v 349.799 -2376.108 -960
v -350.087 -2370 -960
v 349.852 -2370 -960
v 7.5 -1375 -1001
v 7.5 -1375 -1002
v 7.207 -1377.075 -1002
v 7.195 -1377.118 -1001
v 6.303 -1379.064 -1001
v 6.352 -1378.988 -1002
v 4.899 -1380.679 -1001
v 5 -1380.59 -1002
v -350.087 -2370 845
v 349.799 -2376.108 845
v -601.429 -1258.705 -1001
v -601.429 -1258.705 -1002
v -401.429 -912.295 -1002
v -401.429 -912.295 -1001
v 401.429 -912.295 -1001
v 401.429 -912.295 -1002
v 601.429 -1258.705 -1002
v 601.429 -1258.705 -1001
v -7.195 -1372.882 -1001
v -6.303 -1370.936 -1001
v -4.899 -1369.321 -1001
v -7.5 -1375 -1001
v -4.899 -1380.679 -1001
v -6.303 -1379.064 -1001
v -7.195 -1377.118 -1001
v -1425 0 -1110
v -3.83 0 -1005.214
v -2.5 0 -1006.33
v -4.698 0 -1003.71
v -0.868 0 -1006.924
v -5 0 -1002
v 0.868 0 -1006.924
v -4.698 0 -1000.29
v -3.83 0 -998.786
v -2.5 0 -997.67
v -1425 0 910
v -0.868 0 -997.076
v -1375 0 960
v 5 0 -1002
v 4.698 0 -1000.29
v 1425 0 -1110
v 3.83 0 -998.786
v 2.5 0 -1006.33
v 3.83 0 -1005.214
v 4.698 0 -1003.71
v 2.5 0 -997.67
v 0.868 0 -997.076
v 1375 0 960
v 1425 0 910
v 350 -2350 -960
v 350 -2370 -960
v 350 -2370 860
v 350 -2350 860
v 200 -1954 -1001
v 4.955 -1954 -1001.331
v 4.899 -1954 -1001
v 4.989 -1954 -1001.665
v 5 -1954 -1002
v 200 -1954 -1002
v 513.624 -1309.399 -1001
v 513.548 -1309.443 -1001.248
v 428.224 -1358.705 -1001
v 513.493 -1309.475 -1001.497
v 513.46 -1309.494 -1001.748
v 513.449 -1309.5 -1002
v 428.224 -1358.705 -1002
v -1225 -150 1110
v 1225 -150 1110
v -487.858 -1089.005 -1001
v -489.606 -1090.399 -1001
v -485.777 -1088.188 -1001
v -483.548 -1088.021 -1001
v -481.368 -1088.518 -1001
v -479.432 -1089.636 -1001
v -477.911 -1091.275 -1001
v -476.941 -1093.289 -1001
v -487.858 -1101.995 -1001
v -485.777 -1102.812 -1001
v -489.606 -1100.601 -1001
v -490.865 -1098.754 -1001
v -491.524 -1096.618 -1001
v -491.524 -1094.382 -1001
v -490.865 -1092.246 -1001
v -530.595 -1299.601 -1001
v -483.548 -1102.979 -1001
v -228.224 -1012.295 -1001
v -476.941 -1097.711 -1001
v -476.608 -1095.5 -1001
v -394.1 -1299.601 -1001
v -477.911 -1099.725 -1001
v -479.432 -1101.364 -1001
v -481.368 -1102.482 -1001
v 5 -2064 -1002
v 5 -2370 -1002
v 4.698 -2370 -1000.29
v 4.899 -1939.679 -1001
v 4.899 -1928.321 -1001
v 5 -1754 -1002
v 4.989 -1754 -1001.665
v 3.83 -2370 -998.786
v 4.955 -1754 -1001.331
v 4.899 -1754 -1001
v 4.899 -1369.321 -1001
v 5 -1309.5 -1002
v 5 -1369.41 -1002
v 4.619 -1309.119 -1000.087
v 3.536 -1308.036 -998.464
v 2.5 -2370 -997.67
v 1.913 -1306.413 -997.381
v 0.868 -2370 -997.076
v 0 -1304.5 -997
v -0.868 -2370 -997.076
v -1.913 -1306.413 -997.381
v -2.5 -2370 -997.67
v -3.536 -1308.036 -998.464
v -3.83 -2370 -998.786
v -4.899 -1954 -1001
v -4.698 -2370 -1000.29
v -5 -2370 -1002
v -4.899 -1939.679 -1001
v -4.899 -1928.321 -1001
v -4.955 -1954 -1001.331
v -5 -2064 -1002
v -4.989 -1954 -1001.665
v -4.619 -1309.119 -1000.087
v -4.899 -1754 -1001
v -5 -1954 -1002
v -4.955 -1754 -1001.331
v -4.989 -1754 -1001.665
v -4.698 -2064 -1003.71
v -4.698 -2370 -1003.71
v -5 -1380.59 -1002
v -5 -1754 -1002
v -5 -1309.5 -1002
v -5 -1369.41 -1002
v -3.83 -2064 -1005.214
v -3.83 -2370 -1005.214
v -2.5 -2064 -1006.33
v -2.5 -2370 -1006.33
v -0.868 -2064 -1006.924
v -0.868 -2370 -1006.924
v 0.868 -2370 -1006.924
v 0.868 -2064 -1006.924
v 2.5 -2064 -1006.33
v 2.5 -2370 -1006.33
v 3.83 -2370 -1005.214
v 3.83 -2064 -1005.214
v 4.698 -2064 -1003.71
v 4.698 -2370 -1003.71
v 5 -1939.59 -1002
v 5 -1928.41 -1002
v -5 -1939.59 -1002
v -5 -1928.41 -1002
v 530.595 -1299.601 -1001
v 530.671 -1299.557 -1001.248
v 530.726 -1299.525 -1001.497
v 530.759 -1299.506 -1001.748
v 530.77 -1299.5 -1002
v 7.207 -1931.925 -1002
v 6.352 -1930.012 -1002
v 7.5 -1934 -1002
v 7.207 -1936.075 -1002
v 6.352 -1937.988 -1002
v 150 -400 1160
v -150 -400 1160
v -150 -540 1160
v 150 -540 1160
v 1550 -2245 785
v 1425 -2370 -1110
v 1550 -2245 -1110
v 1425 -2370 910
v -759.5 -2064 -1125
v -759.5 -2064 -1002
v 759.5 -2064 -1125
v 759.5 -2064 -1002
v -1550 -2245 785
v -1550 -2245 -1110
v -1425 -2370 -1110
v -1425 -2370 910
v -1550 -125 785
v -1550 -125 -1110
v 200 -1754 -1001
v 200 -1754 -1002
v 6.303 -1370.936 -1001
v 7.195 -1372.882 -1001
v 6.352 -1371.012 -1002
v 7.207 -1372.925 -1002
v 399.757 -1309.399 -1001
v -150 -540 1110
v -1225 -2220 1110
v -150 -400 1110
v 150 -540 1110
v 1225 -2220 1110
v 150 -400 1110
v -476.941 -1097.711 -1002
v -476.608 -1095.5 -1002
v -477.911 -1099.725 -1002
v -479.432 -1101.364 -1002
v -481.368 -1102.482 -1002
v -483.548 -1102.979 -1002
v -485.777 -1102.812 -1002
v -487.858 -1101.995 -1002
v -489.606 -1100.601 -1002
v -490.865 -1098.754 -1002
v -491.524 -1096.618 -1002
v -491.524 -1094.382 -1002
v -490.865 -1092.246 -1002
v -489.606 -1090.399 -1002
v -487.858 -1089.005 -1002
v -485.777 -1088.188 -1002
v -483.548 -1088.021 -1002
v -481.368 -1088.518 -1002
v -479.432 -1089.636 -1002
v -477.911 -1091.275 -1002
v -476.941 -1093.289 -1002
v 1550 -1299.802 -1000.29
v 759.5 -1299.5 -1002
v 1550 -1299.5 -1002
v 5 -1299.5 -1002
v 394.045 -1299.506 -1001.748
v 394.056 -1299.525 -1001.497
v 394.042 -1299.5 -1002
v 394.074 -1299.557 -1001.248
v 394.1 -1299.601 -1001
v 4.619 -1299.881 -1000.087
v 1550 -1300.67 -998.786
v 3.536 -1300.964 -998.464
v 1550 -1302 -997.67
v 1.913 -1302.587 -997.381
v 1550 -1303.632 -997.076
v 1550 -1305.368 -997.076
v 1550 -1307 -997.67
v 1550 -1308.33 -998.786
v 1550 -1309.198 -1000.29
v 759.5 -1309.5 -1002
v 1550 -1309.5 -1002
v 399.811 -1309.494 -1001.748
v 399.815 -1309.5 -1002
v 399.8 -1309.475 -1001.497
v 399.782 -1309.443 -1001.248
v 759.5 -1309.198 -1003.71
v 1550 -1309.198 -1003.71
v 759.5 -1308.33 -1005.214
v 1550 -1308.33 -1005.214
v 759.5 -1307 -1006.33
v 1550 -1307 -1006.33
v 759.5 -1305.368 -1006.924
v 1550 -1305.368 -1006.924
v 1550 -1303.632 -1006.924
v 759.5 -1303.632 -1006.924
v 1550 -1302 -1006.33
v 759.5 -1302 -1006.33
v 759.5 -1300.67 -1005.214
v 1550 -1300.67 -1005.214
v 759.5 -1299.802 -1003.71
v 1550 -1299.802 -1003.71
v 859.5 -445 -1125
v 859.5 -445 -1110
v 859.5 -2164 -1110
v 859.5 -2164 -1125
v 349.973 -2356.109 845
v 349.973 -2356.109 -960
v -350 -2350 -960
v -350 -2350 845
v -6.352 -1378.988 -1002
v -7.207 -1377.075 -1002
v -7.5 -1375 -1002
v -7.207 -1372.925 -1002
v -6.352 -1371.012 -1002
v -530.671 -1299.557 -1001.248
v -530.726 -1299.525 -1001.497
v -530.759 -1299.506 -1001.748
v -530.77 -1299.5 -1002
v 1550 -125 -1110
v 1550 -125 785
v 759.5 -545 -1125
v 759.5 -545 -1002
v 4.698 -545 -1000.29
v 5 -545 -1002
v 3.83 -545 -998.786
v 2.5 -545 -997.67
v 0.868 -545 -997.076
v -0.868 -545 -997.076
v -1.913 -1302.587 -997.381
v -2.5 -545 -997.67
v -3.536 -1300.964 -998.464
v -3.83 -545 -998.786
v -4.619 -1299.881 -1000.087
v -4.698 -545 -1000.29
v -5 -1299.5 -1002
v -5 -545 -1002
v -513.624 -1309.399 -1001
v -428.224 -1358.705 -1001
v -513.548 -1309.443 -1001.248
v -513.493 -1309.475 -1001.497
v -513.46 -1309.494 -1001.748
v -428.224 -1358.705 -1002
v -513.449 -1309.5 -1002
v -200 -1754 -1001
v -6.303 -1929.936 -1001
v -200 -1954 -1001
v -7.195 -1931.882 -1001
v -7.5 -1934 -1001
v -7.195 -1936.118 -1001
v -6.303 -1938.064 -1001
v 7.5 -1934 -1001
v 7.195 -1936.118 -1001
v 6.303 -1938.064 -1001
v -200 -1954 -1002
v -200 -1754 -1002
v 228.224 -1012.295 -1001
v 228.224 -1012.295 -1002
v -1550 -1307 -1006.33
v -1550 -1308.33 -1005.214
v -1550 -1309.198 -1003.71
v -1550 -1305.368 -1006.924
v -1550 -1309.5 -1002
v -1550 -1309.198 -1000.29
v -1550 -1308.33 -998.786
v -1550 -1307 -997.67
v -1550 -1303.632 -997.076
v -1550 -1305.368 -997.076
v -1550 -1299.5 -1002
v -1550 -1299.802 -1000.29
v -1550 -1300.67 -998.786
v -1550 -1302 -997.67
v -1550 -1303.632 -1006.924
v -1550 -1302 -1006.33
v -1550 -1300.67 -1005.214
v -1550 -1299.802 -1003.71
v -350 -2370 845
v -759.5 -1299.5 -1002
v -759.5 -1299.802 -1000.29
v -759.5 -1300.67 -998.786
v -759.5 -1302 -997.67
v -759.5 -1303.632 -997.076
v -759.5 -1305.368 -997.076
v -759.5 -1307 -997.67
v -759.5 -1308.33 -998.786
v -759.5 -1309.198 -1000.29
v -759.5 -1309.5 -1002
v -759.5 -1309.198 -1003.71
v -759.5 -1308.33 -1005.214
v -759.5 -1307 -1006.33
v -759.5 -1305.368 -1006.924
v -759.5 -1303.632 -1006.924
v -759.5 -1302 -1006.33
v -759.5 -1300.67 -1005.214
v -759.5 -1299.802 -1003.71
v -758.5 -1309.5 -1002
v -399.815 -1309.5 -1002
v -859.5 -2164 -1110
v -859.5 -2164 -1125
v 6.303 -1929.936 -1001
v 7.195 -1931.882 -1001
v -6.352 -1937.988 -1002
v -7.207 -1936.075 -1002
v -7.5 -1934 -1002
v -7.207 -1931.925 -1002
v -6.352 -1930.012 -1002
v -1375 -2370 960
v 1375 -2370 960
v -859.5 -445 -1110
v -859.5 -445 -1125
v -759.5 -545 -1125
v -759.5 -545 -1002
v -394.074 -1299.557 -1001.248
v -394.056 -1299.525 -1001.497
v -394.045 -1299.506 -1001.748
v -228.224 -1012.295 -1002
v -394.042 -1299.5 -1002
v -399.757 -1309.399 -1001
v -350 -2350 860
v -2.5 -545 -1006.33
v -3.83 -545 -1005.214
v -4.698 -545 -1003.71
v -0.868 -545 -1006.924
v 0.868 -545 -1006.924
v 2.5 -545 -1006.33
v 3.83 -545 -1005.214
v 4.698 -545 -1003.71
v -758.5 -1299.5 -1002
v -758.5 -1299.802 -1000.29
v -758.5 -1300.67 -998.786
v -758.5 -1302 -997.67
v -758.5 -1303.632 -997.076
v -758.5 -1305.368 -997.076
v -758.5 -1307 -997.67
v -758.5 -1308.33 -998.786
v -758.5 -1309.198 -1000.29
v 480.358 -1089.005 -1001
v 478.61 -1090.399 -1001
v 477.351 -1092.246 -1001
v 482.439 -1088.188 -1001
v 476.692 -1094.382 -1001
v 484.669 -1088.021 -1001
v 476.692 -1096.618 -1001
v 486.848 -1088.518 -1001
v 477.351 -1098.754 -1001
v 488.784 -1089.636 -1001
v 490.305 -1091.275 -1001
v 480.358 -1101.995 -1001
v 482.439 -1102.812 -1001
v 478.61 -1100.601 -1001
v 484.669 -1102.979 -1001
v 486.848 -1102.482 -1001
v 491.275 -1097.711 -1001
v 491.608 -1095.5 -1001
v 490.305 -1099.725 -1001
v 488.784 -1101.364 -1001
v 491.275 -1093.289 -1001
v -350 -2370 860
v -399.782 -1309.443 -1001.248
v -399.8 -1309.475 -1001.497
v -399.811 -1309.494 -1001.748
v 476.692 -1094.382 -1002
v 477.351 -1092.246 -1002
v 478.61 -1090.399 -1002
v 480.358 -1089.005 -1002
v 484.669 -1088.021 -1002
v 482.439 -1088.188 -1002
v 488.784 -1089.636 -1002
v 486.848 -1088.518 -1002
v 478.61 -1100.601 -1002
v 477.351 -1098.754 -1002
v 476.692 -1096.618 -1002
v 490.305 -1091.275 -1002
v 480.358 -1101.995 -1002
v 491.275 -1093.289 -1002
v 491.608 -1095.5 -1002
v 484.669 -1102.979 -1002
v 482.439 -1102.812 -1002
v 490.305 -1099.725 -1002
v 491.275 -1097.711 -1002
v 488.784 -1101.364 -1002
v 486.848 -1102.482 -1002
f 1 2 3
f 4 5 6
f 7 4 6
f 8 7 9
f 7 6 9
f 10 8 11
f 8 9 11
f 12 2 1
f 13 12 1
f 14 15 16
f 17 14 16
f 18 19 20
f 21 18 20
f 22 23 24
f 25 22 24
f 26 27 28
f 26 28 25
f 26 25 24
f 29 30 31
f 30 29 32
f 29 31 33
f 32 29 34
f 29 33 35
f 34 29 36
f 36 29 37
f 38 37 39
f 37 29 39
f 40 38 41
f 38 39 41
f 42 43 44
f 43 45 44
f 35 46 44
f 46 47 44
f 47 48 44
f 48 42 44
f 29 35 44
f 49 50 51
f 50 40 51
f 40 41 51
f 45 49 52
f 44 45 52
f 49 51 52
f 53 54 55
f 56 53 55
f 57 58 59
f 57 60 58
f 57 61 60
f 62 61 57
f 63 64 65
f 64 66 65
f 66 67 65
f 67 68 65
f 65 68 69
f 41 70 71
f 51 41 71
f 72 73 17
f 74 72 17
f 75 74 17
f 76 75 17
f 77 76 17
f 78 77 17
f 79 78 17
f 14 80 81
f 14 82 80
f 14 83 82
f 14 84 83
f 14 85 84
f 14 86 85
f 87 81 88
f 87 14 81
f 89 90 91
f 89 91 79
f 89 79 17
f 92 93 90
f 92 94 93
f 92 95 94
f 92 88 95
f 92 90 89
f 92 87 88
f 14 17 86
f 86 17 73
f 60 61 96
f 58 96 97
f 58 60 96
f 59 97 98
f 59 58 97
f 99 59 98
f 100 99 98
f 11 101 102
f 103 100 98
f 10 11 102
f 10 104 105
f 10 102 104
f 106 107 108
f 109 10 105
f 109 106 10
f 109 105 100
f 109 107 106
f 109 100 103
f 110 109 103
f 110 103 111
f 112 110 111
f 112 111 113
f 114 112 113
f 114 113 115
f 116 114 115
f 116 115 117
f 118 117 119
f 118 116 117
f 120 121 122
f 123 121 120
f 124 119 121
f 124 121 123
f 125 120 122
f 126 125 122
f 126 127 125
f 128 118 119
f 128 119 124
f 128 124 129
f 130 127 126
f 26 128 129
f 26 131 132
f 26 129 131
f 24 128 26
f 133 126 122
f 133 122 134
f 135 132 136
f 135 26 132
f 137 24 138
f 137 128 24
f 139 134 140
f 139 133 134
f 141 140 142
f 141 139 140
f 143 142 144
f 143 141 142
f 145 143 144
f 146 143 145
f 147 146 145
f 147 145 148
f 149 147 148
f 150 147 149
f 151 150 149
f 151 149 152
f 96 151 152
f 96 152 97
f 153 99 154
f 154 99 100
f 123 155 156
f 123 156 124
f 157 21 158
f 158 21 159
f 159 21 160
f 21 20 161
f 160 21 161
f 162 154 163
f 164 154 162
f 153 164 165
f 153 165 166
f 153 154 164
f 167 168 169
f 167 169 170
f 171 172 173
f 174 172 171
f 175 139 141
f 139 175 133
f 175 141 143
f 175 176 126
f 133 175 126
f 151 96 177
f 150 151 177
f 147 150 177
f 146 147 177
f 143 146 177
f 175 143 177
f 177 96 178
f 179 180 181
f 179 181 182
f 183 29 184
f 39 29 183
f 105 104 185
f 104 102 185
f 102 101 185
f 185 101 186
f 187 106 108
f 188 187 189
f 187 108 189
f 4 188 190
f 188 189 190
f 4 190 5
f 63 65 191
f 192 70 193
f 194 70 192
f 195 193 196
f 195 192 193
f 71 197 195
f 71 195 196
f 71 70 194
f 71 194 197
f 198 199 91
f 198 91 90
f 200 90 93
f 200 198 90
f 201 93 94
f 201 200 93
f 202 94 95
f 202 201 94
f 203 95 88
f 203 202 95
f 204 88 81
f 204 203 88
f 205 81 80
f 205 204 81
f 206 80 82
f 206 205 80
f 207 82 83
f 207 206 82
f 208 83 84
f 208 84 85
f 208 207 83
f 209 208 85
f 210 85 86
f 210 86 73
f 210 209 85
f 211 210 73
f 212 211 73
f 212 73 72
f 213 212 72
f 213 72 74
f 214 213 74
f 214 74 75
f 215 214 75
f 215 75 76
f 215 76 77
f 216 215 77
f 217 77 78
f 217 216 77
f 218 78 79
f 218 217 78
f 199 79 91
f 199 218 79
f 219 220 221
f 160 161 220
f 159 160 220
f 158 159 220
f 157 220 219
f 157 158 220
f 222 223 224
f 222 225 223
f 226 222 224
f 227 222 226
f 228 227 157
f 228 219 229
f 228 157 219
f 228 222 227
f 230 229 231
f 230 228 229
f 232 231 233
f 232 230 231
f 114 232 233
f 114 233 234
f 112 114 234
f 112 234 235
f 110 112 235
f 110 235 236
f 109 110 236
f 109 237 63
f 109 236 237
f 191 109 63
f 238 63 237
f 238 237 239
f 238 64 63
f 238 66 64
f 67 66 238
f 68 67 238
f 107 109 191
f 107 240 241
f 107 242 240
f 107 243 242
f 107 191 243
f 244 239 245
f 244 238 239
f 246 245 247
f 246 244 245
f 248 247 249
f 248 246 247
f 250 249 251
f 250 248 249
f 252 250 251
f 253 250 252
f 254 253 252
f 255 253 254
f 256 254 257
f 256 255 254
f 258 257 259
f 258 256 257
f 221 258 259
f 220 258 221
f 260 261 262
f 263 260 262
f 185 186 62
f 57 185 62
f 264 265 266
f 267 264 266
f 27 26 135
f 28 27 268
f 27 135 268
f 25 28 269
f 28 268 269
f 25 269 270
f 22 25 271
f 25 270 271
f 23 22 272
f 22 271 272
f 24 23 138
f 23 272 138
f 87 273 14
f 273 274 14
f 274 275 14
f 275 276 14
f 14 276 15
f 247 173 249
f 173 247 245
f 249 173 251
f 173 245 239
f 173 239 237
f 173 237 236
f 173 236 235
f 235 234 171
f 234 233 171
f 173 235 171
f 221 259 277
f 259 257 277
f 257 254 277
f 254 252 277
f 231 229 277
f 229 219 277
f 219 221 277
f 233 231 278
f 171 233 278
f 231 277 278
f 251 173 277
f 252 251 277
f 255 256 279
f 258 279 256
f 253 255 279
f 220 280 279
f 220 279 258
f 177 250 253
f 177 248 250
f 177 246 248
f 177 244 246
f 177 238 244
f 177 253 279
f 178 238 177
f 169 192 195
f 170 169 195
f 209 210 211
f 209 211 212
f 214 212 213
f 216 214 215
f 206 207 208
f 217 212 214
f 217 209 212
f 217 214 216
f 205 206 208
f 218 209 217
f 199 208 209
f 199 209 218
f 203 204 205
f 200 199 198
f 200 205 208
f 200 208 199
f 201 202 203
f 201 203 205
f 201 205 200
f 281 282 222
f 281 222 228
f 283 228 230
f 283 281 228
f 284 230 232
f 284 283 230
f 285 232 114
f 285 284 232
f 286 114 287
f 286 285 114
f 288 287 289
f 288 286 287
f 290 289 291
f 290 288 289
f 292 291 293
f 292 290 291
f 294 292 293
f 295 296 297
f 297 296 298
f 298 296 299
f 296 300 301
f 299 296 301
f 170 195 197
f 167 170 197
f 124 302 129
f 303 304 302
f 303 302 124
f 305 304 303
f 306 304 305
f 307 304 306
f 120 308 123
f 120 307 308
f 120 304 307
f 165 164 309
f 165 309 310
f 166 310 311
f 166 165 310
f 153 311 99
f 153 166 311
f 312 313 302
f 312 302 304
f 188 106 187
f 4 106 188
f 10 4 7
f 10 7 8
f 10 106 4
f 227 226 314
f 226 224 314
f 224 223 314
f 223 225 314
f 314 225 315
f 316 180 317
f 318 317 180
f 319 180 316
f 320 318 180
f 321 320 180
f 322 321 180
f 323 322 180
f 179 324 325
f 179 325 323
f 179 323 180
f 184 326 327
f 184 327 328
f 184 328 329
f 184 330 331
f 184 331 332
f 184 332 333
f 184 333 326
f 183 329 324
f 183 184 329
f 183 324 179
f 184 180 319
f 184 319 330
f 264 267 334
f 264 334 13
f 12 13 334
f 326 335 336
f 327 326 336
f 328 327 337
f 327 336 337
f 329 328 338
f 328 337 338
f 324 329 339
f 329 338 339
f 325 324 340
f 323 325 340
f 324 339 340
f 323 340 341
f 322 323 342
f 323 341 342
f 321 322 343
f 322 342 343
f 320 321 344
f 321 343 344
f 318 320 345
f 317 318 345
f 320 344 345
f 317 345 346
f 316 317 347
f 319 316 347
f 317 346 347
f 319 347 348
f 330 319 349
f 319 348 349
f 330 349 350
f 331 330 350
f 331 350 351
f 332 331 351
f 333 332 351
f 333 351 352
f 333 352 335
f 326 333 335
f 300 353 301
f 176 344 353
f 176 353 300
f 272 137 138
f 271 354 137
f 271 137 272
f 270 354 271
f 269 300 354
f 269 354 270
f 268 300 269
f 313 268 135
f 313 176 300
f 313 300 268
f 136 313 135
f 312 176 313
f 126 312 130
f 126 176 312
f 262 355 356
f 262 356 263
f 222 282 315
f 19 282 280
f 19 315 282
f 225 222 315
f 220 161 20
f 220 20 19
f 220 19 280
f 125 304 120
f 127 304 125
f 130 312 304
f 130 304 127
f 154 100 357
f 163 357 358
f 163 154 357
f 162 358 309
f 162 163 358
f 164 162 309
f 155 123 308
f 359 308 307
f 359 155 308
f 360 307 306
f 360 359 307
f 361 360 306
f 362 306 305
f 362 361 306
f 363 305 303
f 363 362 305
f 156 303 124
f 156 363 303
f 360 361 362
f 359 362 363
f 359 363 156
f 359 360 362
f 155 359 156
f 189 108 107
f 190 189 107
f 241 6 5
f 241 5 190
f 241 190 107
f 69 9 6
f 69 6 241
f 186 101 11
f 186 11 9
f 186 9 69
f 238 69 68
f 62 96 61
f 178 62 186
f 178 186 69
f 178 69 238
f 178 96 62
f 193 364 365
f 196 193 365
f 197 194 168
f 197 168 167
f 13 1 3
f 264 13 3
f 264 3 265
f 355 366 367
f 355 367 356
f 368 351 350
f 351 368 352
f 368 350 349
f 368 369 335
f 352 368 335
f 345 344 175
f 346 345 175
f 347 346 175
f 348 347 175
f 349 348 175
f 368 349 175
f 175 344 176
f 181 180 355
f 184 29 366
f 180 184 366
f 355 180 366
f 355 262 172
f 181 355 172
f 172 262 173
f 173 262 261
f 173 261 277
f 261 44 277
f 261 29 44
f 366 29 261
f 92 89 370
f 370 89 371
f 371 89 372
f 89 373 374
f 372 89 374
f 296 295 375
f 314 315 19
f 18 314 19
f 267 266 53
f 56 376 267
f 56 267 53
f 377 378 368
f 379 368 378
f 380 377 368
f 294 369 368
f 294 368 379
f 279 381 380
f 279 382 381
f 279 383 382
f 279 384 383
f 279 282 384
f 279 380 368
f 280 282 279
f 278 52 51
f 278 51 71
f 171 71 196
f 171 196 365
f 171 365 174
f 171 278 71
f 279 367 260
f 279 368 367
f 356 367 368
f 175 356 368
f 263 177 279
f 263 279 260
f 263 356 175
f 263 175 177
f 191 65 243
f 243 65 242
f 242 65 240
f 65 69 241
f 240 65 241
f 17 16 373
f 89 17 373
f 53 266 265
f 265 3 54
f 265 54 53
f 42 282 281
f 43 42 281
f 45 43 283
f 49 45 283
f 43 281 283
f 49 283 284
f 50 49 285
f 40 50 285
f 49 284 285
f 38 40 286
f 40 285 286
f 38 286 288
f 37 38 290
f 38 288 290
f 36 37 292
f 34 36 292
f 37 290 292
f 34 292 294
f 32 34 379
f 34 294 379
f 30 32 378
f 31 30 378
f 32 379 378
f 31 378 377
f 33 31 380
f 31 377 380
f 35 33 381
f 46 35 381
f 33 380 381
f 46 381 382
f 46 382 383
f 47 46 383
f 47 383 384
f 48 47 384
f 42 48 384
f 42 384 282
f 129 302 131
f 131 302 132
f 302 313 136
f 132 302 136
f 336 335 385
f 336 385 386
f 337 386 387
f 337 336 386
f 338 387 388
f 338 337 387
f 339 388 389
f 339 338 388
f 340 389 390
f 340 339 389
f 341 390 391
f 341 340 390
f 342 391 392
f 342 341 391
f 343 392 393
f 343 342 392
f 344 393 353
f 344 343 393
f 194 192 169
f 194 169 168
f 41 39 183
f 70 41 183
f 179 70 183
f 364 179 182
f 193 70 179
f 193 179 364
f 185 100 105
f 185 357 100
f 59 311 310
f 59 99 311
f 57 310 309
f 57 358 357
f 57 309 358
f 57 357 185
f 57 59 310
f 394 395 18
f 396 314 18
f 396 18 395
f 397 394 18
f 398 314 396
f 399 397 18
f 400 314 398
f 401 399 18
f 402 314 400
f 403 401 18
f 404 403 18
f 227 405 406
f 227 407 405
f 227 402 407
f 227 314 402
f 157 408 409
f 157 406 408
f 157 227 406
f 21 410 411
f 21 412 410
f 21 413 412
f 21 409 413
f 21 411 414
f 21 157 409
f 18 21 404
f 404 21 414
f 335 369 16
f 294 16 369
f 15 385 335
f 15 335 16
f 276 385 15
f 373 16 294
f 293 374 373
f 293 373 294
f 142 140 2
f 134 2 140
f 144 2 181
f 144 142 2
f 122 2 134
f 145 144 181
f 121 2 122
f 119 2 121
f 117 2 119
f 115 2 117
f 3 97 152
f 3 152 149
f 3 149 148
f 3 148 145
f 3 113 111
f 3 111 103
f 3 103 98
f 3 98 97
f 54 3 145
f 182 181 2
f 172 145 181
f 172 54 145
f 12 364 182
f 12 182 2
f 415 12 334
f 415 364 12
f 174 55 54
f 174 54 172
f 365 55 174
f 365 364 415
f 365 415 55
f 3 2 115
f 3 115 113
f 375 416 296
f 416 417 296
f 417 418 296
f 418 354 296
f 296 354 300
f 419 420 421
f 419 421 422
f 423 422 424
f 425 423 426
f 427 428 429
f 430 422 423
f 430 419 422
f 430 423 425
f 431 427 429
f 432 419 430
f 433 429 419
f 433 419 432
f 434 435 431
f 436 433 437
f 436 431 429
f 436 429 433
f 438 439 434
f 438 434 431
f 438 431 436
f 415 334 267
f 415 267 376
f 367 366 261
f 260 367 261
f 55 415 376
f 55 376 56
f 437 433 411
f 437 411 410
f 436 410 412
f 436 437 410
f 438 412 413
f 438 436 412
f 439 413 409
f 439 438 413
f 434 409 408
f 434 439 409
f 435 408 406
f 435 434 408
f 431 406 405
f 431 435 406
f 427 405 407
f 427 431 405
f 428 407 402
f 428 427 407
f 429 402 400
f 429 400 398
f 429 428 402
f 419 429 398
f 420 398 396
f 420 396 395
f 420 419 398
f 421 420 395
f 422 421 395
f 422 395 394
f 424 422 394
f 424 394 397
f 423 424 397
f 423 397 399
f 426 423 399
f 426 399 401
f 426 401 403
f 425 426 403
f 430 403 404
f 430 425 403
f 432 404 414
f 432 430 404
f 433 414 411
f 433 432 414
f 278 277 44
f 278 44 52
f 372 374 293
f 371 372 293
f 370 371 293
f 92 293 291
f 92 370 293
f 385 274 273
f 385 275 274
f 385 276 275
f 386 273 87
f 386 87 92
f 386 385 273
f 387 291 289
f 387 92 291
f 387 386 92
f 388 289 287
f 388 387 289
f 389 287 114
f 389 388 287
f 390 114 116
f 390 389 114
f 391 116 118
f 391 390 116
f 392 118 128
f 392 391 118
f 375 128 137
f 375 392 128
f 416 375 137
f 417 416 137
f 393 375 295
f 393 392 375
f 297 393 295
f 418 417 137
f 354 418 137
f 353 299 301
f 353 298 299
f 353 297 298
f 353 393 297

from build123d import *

# Parameters (mm, degrees)
F0_W           = 3100
F0_H           = 2220
F1_DEPTH       = 2370
F2_SIZE        = 325
F3_SIZE        = 325
F4_SIZE        = 125
F5_SIZE        = 125
F6_SIZE        = 125
F7_SIZE        = 125
F8_W           = 1519
F8_H           = 1519
F9_DEPTH       = 108
F10_W          = 400
F10_H          = 200
F10_R          = 7.5
F11_DEPTH      = 1
F12_R          = 5
F13_DEPTH      = 1
F14_DEPTH      = 790.501
F14_DEPTH_BACK = 2309.501
F15_R          = 5
F16_DEPTH      = 545.001
F16_DEPTH_BACK = 1825.001
F17_SIZE       = 150
F18_SIZE       = 150
F19_W          = 1719
F19_H          = 1719
F19_W_2        = 1519
F19_H_2        = 1519
F20_DEPTH      = 15
F21_W          = 700
F21_H          = 1820
F22_DEPTH      = 20
F23_W          = 300
F23_H          = 140
F24_DEPTH      = 50
F26_DEPTH      = 1805


# Not quite as in the source:
# - a feature of the source that left no trace in its solid (it failed there, or was rolled back) is left out


with BuildPart() as f1:
    # F0 (on Front) → F1 (new body)
    with BuildSketch(Plane.XZ):
        Rectangle(F0_W, F0_H)
    extrude(amount=F1_DEPTH)

    # F2
    f2_edges = [f1.edges().sort_by_distance(p)[0] for p in [
        (-1550, -1185, 1110),
    ]]
    chamfer(f2_edges, length=F2_SIZE)

    # F3
    f3_edges = [f1.edges().sort_by_distance(p)[0] for p in [
        (1550, -1185, 1110),
    ]]
    chamfer(f3_edges, length=F3_SIZE)

    # F4
    f4_edges = [f1.edges().sort_by_distance(p)[0] for p in [
        (1550, -2370, -162.5),
    ]]
    chamfer(f4_edges, length=F4_SIZE)

    # F5
    f5_edges = [f1.edges().sort_by_distance(p)[0] for p in [
        (-1550, -2370, -162.5),
    ]]
    chamfer(f5_edges, length=F5_SIZE)

    # F6
    f6_edges = [f1.edges().sort_by_distance(p)[0] for p in [
        (-1550, 0, -162.5),
    ]]
    chamfer(f6_edges, length=F6_SIZE)

    # F7
    f7_edges = [f1.edges().sort_by_distance(p)[0] for p in [
        (1550, 0, -162.5),
    ]]
    chamfer(f7_edges, length=F7_SIZE)

    # F8 (on face) → F9 (cut)
    with BuildSketch(Plane(origin=(0, 0, -1110), x_dir=(1, 0, 0), z_dir=(0, 0, -1))):
        with Locations((0, 1304.5)):
            Rectangle(F8_W, F8_H)
    extrude(amount=-F9_DEPTH, mode=Mode.SUBTRACT)

    # F10 (on face) → F11 (cut)
    with BuildSketch(Plane(origin=(0, 0, -1002), x_dir=(1, 0, 0), z_dir=(0, 0, -1))):
        with Locations((0, 1854)):
            Rectangle(F10_W, F10_H)
        with Locations((0, 1934)):
            Circle(F10_R, mode=Mode.SUBTRACT)
        Polygon((601.4287087912, 1258.7050807569), (428.2236280343, 1358.7050807569), (228.2236280343, 1012.2949192431), (401.4287087912, 912.2949192431), align=None)
        with Locations((484.1082007155, 1095.5)):
            Circle(F10_R, mode=Mode.SUBTRACT)
        Polygon((-228.2236280343, 1012.2949192431), (-428.2236280343, 1358.7050807569), (-601.4287087912, 1258.7050807569), (-401.4287087912, 912.2949192431), align=None)
        with Locations((-484.1082007155, 1095.5)):
            Circle(F10_R, mode=Mode.SUBTRACT)
        with Locations((0, 1375)):
            Circle(F10_R)
    extrude(amount=-F11_DEPTH, mode=Mode.SUBTRACT)

    # F12 (on face) → F13 (cut)
    with BuildSketch(Plane.YZ.offset(-759.5)):
        with Locations((-1304.5, -1002)):
            Circle(F12_R)
    extrude(amount=F13_DEPTH, mode=Mode.SUBTRACT)

    # F12 (on face) → F14 (cut, two sides)
    with BuildSketch(Plane.YZ.offset(-759.5)) as f14_sk:
        with Locations((-1304.5, -1002)):
            Circle(F12_R)
    extrude(amount=-F14_DEPTH, mode=Mode.SUBTRACT)
    extrude(f14_sk.sketch, amount=F14_DEPTH_BACK, mode=Mode.SUBTRACT)

    # F15 (on face) → F16 (cut, two sides)
    with BuildSketch(Plane.XZ.offset(545)) as f16_sk:
        with Locations((0, -1002)):
            Circle(F15_R)
    extrude(amount=-F16_DEPTH, mode=Mode.SUBTRACT)
    extrude(f16_sk.sketch, amount=F16_DEPTH_BACK, mode=Mode.SUBTRACT)

    # F17
    f17_edges = [f1.edges().sort_by_distance(p)[0] for p in [
        (0, 0, 1110),
    ]]
    chamfer(f17_edges, length=F17_SIZE)

    # F18
    f18_edges = [f1.edges().sort_by_distance(p)[0] for p in [
        (0, -2370, 1110),
    ]]
    chamfer(f18_edges, length=F18_SIZE)

    # F19 (on face) → F20 (join)
    with BuildSketch(Plane(origin=(0, 0, -1110), x_dir=(1, 0, 0), z_dir=(0, 0, -1))):
        with Locations((0, 1304.5)):
            Rectangle(F19_W, F19_H)
        with Locations((0, 1304.5)):
            Rectangle(F19_W_2, F19_H_2, mode=Mode.SUBTRACT)
    extrude(amount=F20_DEPTH)

    # F21 (on face) → F22 (cut)
    with BuildSketch(Plane.XZ.offset(2370)):
        with Locations((0, -50)):
            Rectangle(F21_W, F21_H)
    extrude(amount=-F22_DEPTH, mode=Mode.SUBTRACT)

    # F23 (on face) → F24 (join)
    with BuildSketch(Plane.XY.offset(1110)):
        with Locations((0, -470)):
            Rectangle(F23_W, F23_H)
    extrude(amount=F24_DEPTH)

    # F25 (on face) → F26 (join)
    with BuildSketch(Plane.XY.offset(-960)):
        Polygon((-350, -2350), (-350.17453071, -2369.9992384613), (349.798815435, -2376.1078133101), (349.9733461449, -2356.1085748489), align=None)
    extrude(amount=F26_DEPTH)


solid = f1.part
